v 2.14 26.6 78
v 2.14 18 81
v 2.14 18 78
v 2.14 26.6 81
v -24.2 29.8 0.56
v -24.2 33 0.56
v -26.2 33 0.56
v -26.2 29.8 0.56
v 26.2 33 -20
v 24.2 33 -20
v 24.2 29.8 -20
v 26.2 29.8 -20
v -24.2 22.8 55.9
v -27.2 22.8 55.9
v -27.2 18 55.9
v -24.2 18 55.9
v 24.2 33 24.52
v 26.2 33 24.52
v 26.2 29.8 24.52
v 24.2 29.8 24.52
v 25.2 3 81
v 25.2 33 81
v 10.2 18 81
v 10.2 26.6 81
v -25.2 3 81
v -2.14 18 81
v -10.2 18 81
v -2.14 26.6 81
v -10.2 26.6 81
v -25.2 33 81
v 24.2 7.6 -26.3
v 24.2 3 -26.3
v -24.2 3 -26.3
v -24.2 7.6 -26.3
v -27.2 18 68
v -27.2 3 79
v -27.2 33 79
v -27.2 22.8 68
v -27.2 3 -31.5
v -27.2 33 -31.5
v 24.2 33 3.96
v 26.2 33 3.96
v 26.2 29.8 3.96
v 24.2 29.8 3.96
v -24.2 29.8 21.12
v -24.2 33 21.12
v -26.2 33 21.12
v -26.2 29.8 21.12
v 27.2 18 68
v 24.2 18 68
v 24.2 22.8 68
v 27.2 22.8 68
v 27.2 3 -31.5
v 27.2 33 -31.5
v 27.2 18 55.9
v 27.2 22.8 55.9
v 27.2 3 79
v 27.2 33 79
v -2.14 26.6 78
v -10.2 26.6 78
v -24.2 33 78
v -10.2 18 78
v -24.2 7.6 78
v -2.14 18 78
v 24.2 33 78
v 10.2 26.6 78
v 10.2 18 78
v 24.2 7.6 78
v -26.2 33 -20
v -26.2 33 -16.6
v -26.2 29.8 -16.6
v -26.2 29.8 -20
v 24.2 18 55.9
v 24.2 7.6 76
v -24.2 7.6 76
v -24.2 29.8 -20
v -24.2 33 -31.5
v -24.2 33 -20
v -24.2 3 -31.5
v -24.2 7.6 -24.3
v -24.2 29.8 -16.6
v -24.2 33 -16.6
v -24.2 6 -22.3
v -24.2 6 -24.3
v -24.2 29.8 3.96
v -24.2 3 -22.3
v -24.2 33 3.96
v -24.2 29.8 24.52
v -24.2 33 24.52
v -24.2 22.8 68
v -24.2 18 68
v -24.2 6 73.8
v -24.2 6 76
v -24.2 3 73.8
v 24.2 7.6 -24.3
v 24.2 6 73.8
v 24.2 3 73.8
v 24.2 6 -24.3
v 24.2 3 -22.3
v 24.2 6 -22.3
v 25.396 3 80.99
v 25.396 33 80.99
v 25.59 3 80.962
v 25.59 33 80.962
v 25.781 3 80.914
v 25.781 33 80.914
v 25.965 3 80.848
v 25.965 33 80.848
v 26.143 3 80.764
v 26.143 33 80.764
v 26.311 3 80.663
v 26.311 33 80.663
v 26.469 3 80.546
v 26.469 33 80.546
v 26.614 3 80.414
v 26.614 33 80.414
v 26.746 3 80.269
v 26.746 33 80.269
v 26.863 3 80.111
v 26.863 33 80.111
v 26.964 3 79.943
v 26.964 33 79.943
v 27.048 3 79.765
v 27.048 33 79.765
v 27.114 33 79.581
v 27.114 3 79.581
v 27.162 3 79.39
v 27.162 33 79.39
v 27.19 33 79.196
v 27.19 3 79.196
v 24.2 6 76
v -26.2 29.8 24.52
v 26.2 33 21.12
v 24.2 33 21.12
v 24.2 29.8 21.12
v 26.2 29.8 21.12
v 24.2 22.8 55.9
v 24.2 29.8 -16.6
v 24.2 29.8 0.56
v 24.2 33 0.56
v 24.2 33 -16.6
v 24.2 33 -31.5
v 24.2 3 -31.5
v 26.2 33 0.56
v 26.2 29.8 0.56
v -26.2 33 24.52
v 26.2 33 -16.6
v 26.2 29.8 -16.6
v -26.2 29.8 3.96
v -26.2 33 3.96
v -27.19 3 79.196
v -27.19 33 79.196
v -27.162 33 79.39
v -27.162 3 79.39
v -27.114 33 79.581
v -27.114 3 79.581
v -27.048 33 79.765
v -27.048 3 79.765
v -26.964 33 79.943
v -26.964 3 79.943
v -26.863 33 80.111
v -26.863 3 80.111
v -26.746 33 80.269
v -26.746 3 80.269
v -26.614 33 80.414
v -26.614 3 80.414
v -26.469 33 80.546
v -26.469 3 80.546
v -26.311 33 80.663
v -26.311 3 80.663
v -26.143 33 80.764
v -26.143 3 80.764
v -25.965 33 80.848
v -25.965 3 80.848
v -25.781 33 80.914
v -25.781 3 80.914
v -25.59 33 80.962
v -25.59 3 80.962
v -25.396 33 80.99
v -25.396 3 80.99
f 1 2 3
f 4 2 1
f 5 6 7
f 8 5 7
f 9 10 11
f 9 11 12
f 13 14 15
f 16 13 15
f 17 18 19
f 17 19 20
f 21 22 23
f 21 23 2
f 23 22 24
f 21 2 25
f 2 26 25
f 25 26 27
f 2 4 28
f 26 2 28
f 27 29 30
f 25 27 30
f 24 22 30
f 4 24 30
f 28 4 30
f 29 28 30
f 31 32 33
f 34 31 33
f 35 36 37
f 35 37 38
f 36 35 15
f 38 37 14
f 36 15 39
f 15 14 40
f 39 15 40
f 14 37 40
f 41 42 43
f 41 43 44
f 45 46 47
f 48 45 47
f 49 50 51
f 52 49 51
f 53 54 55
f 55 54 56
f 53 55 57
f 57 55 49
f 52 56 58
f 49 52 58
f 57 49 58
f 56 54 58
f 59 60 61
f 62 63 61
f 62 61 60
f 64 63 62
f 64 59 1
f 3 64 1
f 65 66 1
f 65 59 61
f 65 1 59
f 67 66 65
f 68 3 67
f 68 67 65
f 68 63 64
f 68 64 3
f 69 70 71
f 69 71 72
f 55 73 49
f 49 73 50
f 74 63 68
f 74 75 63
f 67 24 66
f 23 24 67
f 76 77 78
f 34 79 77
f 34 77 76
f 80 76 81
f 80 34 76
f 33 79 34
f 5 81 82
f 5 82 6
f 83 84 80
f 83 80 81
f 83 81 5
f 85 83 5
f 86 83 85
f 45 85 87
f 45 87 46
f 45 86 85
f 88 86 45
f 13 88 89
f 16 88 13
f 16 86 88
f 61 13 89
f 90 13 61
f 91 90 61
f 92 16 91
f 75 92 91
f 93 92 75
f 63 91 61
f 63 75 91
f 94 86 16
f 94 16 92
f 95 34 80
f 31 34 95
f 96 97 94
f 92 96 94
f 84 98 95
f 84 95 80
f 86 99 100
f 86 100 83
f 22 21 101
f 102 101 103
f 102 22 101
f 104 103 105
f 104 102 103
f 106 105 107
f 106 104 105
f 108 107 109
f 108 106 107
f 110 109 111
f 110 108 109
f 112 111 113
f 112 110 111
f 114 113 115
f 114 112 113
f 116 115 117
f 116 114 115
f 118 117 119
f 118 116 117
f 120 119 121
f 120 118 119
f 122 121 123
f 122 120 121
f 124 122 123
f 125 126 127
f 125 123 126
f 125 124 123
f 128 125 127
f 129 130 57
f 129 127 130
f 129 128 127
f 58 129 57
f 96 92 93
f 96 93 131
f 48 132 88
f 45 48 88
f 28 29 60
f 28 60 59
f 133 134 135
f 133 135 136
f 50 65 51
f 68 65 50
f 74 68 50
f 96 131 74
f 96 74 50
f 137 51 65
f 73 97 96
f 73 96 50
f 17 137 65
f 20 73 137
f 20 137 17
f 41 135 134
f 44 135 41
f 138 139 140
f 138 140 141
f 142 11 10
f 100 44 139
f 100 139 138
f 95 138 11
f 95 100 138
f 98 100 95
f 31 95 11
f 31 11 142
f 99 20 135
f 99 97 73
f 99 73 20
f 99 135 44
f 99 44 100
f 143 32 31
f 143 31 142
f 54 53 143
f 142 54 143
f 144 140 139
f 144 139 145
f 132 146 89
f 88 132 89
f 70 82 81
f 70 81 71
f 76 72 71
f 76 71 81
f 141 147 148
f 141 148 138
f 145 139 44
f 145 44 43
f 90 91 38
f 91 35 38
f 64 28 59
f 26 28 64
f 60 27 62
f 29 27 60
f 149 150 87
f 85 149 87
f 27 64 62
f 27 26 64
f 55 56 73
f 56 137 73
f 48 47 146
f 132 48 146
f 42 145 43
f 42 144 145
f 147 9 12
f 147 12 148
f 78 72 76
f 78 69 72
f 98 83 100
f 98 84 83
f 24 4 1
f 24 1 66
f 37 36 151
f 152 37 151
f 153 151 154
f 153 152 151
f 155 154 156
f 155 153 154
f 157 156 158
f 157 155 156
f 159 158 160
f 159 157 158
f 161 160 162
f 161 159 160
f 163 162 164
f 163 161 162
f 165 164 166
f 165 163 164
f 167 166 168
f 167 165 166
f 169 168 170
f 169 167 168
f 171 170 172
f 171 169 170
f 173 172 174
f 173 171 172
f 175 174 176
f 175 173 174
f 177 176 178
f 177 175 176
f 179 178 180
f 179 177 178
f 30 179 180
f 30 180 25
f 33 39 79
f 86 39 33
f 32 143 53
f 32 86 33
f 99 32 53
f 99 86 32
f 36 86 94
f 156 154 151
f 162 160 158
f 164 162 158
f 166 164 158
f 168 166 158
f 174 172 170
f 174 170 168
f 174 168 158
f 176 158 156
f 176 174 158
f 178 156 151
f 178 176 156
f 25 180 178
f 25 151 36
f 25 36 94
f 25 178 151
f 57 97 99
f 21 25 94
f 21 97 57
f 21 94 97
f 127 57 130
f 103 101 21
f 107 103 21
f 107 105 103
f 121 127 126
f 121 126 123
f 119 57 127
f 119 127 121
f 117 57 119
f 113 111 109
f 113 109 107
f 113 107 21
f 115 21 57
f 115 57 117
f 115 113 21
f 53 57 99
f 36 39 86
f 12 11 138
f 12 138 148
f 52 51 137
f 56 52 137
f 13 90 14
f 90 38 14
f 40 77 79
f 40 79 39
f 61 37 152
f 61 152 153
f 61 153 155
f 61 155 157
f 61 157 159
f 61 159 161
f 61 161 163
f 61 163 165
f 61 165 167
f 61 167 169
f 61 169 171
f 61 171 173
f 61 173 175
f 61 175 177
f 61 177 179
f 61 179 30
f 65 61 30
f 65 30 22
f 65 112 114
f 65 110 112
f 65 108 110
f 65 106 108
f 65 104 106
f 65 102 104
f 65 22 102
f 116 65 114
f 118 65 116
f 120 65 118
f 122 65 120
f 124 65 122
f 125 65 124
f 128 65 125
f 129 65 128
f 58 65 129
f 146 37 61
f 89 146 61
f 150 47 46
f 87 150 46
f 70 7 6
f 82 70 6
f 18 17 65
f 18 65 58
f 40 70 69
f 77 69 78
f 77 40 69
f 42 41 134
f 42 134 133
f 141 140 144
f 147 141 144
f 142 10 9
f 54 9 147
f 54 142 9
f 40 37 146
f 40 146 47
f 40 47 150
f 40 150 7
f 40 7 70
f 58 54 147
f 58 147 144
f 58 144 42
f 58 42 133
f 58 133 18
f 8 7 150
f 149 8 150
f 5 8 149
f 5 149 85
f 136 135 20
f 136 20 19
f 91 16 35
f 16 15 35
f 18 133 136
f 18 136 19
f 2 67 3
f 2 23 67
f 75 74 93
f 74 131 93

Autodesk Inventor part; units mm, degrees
ref_plane "YZ Plane" through (0, 0, 0) normal (1, 0, 0) x (0, 1, 0)
ref_plane "XZ Plane" through (0, 0, 0) normal (0, 1, 0) x (-1, 0, 0)
ref_plane "XY Plane" through (0, 0, 0) normal (0, 0, 1) x (1, 0, 0)
sketch "Sketch2" plane through (0, 0, 0) normal (0, 1, 0) x (-1, 0, 0)
  line L0 (-30.2, -84) -> (30.2, -84)
  line L1 (30.2, -84) -> (30.2, 84)
  line L2 (30.2, 84) -> (-30.2, 84)
  line L3 (-30.2, 84) -> (-30.2, -84)
  line L4 (-30.2, -84) -> (30.2, 84) construction
  line L5 (30.2, -84) -> (-30.2, 84) construction
  point P0 (0, 0)
  dimension "d0" = 60.4
  dimension "d1" = 168
extrude "Extrusion1" add sketch "Sketch2" along normal blind 3
sketch "Sketch3" plane through (0, 3, 0) normal (0, 1, 0) x (1, 0, 0)
  line L0 (27.2, 81) -> (-27.2, 81)
  line L1 (-27.2, 81) -> (-27.2, -81)
  line L2 (-27.2, -81) -> (27.2, -81)
  line L3 (27.2, -81) -> (27.2, 81)
  line L4 (27.2, 81) -> (-27.2, -81) construction
  line L5 (-27.2, 81) -> (27.2, -81) construction
  line L6 (-30.2, 84) -> (-30.2, -84) projected
  line L7 (-30.2, -84) -> (30.2, -84) projected
  line L8 (24.2, 78) -> (-24.2, 78)
  line L9 (-24.2, 78) -> (-24.2, -78)
  line L10 (-24.2, -78) -> (24.2, -78)
  line L11 (24.2, -78) -> (24.2, 78)
  line L12 (24.2, 78) -> (-24.2, -78) construction
  line L13 (-24.2, 78) -> (24.2, -78) construction
  point P0 (0, 0)
  dimension "d4" = 3
  dimension "d5" = 3
  dimension "d6" = 3
  dimension "d7" = 3
extrude "Extrusion2" add sketch "Sketch3" along normal blind 30
fillet "Fillet1" radius 2 8 edges at (27.2, 18, 81) (-27.2, 18, 81) (-30.2, 1.5, 84) (30.2, 1.5, 84) (27.2, 18, -81) (-27.2, 18, -81) (30.2, 1.5, -84) (-30.2, 1.5, -84)
sketch "Sketch10" plane through (0, 3, 0) normal (0, 1, 0) x (1, 0, 0)
  line L0 (24.2, 78) -> (-24.2, 78) projected
  line L1 (-24.2, 78) -> (-24.2, -78) projected
  line L2 (-24.2, -78) -> (24.2, -78) projected
  line L3 (24.2, -78) -> (24.2, 78) projected
  line L4 (-24.2, -78) -> (24.2, -78)
  line L5 (24.2, -78) -> (24.2, -73.8)
  line L6 (24.2, -73.8) -> (-24.2, -73.8)
  line L7 (-24.2, -73.8) -> (-24.2, -78)
  line L8 (-24.2, -73.8) -> (24.2, -73.8)
  line L9 (24.2, -73.8) -> (24.2, 22.3)
  line L10 (24.2, 22.3) -> (-24.2, 22.3)
  line L11 (-24.2, 22.3) -> (-24.2, -73.8)
  line L12 (-24.2, 22.3) -> (24.2, 22.3)
  line L13 (24.2, 22.3) -> (24.2, 26.3)
  line L14 (24.2, 26.3) -> (-24.2, 26.3)
  line L15 (-24.2, 26.3) -> (-24.2, 22.3)
  point P0 (0, 0)
  point P1 (-24.2, 26.3)
  point P2 (-24.2, 22.3)
  dimension "d90" = 4.2
  dimension "d91" = 96.1
  dimension "d92" = 4
extrude "Extrusion9" add sketch "Sketch10" along normal blind 3 contours L3 L10 L1 L14 | L3 L2 L1 L6
sketch "Sketch11" plane through (0, 6, 0) normal (0, 1, 0) x (1, 0, 0)
  line L0 (-24.2, 22.3) -> (-24.2, 26.3) projected
  line L1 (-24.2, 22.3) -> (24.2, 22.3) projected
  line L2 (24.2, 26.3) -> (24.2, 22.3) projected
  line L3 (24.2, 26.3) -> (-24.2, 26.3) projected
  line L4 (-24.2, -78) -> (-24.2, -73.8) projected
  line L5 (24.2, -78) -> (-24.2, -78) projected
  line L6 (24.2, -73.8) -> (24.2, -78) projected
  line L7 (24.2, -73.8) -> (-24.2, -73.8) projected
  line L8 (24.2, 26.3) -> (-24.2, 26.3) projected
  line L9 (-24.2, 26.3) -> (24.2, 26.3)
  line L10 (24.2, 26.3) -> (24.2, 24.3)
  line L11 (24.2, 24.3) -> (-24.2, 24.3)
  line L12 (-24.2, 24.3) -> (-24.2, 26.3)
  line L13 (24.2, 26.3) -> (24.2, -78) projected
  line L14 (-24.2, -78) -> (24.2, -78)
  line L15 (24.2, -78) -> (24.2, -76)
  line L16 (24.2, -76) -> (-24.2, -76)
  line L17 (-24.2, -76) -> (-24.2, -78)
  line L18 (-24.2, 22.3) -> (-24.2, 26.3) projected
  line L19 (-24.2, 22.3) -> (24.2, 22.3) projected
  line L20 (24.2, 26.3) -> (-24.2, 26.3) projected
  line L21 (24.2, 26.3) -> (24.2, 22.3) projected
  point P0 (0, 0)
  point P1 (24.2, -72.6)
  point P2 (-24.2, 24.3)
  point P3 (-24.2, -76)
  point P4 (-24.2, -76)
  dimension "d95" = 2
  dimension "d120" = 2
extrude "Extrusion10" add sketch "Sketch11" along normal blind 1.6 contours L0 L3 L2 L11 | L6 L5 L4 L16
sketch "Sketch12" plane through (-25.2, 3, 81) normal (0, 0, 1) x (1, 0, 0)
  line L0 (-2, 30) -> (-2, 0) projected
  line L1 (0, 30) -> (50.4, 30) projected
  line L2 (-2, 30) -> (0, 30) projected
  line L3 (50.4, 30) -> (52.4, 30) projected
  line L4 (52.4, 0) -> (52.4, 30) projected
  line L5 (50.4, 0) -> (0, 0) projected
  line L6 (0, 0) -> (-2, 0) projected
  line L7 (52.4, 0) -> (50.4, 0) projected
  line L8 (15, 23.6) -> (23.06, 23.6)
  line L9 (23.06, 23.6) -> (23.06, 15)
  line L10 (23.06, 15) -> (15, 15)
  line L11 (15, 15) -> (15, 23.6)
  line L12 (27.34, 23.6) -> (35.4, 23.6)
  line L13 (35.4, 23.6) -> (35.4, 15)
  line L14 (35.4, 15) -> (27.34, 15)
  line L15 (27.34, 15) -> (27.34, 23.6)
  point P0 (25.2, -3)
  dimension "d116" = 8.06
  dimension "d117" = 8.6
  dimension "d118" = 15
  dimension "d119" = 17
  dimension "d121" = 8.06
  dimension "d122" = 8.6
  dimension "d123" = 15
  dimension "d124" = 17
extrude "Extrusion11" cut sketch "Sketch12" against normal blind 3 contours L8 L9 L10 L11 | L12 L13 L14 L15
sketch "Sketch13" plane through (0, 3, 0) normal (0, 1, 0) x (1, 0, 0)
  arc A0 (-28.2, 84) -> (-30.2, 82) centre (-28.2, 82) ccw projected
  line L0 (-30.2, 82) -> (-30.2, -82) projected
  arc A1 (-30.2, -82) -> (-28.2, -84) centre (-28.2, -82) ccw projected
  line L1 (-28.2, -84) -> (28.2, -84) projected
  arc A2 (28.2, -84) -> (30.2, -82) centre (28.2, -82) ccw projected
  line L2 (30.2, -82) -> (30.2, 82) projected
  arc A3 (30.2, 82) -> (28.2, 84) centre (28.2, 82) ccw projected
  line L3 (28.2, 84) -> (-28.2, 84) projected
  line L4 (-25.2, 81) -> (25.2, 81) projected
  arc A4 (27.2, 79) -> (25.2, 81) centre (25.2, 79) ccw projected
  line L5 (27.2, 79) -> (27.2, -79) projected
  arc A5 (25.2, -81) -> (27.2, -79) centre (25.2, -79) ccw projected
  line L6 (25.2, -81) -> (-25.2, -81) projected
  arc A6 (-27.2, -79) -> (-25.2, -81) centre (-25.2, -79) ccw projected
  line L7 (-27.2, -79) -> (-27.2, 79) projected
  arc A7 (-25.2, 81) -> (-27.2, 79) centre (-25.2, 79) ccw projected
  point P0 (0, 0)
extrude "Extrusion12" cut sketch "Sketch13" against normal blind 3
sketch "Sketch14" plane through (25.2, 33, -81) normal (0, 0, -1) x (-1, 0, 0)
  line L0 (1, -10) -> (49.4, -10)
  line L1 (49.4, -10) -> (49.4, -19.6)
  line L2 (49.4, -19.6) -> (1, -19.6)
  line L3 (1, -19.6) -> (1, -10)
  line L4 (52.4, -33) -> (52.4, 0) projected
  line L5 (-2, 0) -> (-2, -33) projected
  line L6 (50.4, 0) -> (50.4, -33) projected
  line L7 (50.4, -33) -> (0, -33) projected
  point P0 (25.2, -33)
  point P1 (50.4, -16.5)
  point P2 (49.4, -14.8)
  dimension "d127" = 9.6
  dimension "d128" = 3
  dimension "d129" = 3
  dimension "d140" = 23
extrude "Extrusion13" add sketch "Sketch14" along normal blind 6
sketch "Sketch15" plane through (-24.2, 13.4, -81) normal (-1, 0, 0) x (0, 0, 1)
  line L0 (0, 9.6) -> (-6, 9.6) projected
  line L1 (0, 9.6) -> (-3.4, 9.6)
  line L2 (-3.4, 9.6) -> (-3.4, 6.6)
  line L3 (-3.4, 6.6) -> (0, 6.6)
  line L4 (0, 6.6) -> (0, 9.6)
  line L5 (0, 9.6) -> (0, 0) projected
  line L6 (0, 9.6) -> (-6, 9.6) projected
  line L7 (-6, 0) -> (-6, 9.6) projected
  line L8 (0, 0) -> (-6, 0) projected
  line L9 (0, 0) -> (-3.4, 0)
  line L10 (-3.4, 0) -> (-3.4, 3)
  line L11 (-3.4, 3) -> (0, 3)
  line L12 (0, 3) -> (0, 0)
  point P0 (81, -13.4)
  point P1 (-3.4, 0)
  dimension "d133" = 3.4
  dimension "d134" = 3
  dimension "d135" = 3.4
  dimension "d136" = 3
extrude "Extrusion14" cut sketch "Sketch15" against normal up to surface (48.4 mm away) contours L4 L3 L2 L0 | L5 L8 L10 L11
fillet "Fillet8" radius 1 18 edges at (0, 23, -87) (0, 23, -84.4) (0, 13.4, -87) (0, 13.4, -84.4) (-24.2, 14.9, -84.4) (-24.2, 18.2, -87) (-24.2, 21.5, -84.4) (-24.2, 23, -85.7) (-24.2, 13.4, -85.7) (-24.2, 16.4, -82.7) (-24.2, 20, -82.7) (24.2, 20, -82.7) (24.2, 16.4, -82.7) (24.2, 14.9, -84.4) (24.2, 21.5, -84.4) (24.2, 23, -85.7) (24.2, 18.2, -87) (24.2, 13.4, -85.7)
sketch "Sketch16" plane through (-27.2, 0, -79) normal (-1, 0, 0) x (0, 0, 1)
  line L0 (147, 22.8) -> (134.9, 22.8)
  line L1 (134.9, 22.8) -> (134.9, 18)
  line L2 (134.9, 18) -> (147, 18)
  line L3 (147, 18) -> (147, 22.8)
  line L4 (160, 3) -> (160, 33) projected
  line L5 (152, 0) -> (0, 0) projected
  point P0 (79, 0)
  point P1 (154, 0)
  dimension "d141" = 12.1
  dimension "d142" = 4.8
  dimension "d143" = 13
  dimension "d144" = 18
extrude "Extrusion15" cut sketch "Sketch16" against normal through all
sketch "Sketch17" plane through (0, 33, 0) normal (0, 1, 0) x (1, 0, 0)
  arc A0 (-25.2, 81) -> (-27.2, 79) centre (-25.2, 79) ccw projected
  line L0 (-27.2, 79) -> (-27.2, -79) projected
  arc A1 (-27.2, -79) -> (-25.2, -81) centre (-25.2, -79) ccw projected
  line L1 (-25.2, -81) -> (25.2, -81) projected
  arc A2 (25.2, -81) -> (27.2, -79) centre (25.2, -79) ccw projected
  line L2 (27.2, -79) -> (27.2, 79) projected
  arc A3 (27.2, 79) -> (25.2, 81) centre (25.2, 79) ccw projected
  line L3 (25.2, 81) -> (-25.2, 81) projected
  line L4 (24.2, 78) -> (24.2, -78) projected
  line L5 (24.2, -78) -> (-24.2, -78) projected
  line L6 (-24.2, -78) -> (-24.2, 78) projected
  line L7 (-24.2, 78) -> (24.2, 78) projected
  line L8 (-26.2, 20) -> (-24.2, 20)
  line L9 (-24.2, 20) -> (-24.2, 16.6)
  line L10 (-24.2, 16.6) -> (-26.2, 16.6)
  line L11 (-26.2, 16.6) -> (-26.2, 20)
  line L12 (-24.2, -0.56) -> (-26.2, -0.56)
  line L13 (-26.2, -0.56) -> (-26.2, -3.96)
  line L14 (-26.2, -3.96) -> (-24.2, -3.96)
  line L15 (-24.2, -3.96) -> (-24.2, -0.56)
  line L16 (-24.2, 22.3) -> (-24.2, 26.3) projected
  line L17 (-24.2, -21.12) -> (-26.2, -21.12)
  line L18 (-26.2, -21.12) -> (-26.2, -24.52)
  line L19 (-26.2, -24.52) -> (-24.2, -24.52)
  line L20 (-24.2, -24.52) -> (-24.2, -21.12)
  line L21 (24.2, 20) -> (26.2, 20)
  line L22 (26.2, 20) -> (26.2, 16.6)
  line L23 (26.2, 16.6) -> (24.2, 16.6)
  line L24 (24.2, 16.6) -> (24.2, 20)
  line L25 (24.2, -0.56) -> (26.2, -0.56)
  line L26 (26.2, -0.56) -> (26.2, -3.96)
  line L27 (26.2, -3.96) -> (24.2, -3.96)
  line L28 (24.2, -3.96) -> (24.2, -0.56)
  line L29 (24.2, -21.12) -> (26.2, -21.12)
  line L30 (26.2, -21.12) -> (26.2, -24.52)
  line L31 (26.2, -24.52) -> (24.2, -24.52)
  line L32 (24.2, -24.52) -> (24.2, -21.12)
  point P0 (0, 0)
  point P1 (-24.2, 16.6)
  point P2 (-24.2, -73.8)
  point P3 (24.2, 16.6)
  point P4 (24.2, -3.96)
  point P5 (24.2, -24.52)
  point P6 (-24.2, -24.52)
  point P7 (-24.2, -21.12)
  point P8 (-24.2, -3.96)
  dimension "d147" = 2
  dimension "d148" = 3.4
  dimension "d149" = 61
  dimension "d150" = 0
  dimension "d153" = 2
  dimension "d154" = 3.4
  dimension "d155" = 20.56
  dimension "d156" = 2
  dimension "d157" = 3.4
  dimension "d158" = 20.56
  dimension "d159" = 2
  dimension "d160" = 3.4
  dimension "d161" = 2
  dimension "d162" = 3.4
  dimension "d163" = 2
  dimension "d164" = 3.4
  dimension "d165" = 20.56
  dimension "d166" = 20.56
  dimension "d167" = 61
extrude "Extrusion16" cut sketch "Sketch17" against normal blind 3.2 contours L21 L22 L23 L4 | L25 L26 L27 L4 | L6 L10 L11 L8 | L29 L30 L31 L4 | L6 L14 L13 L12 | L6 L19 L18 L17
sketch "Sketch18" plane through (0, 33, 0) normal (0, 1, 0) x (1, 0, 0)
  line L0 (24.2, -21.12) -> (26.2, -21.12) projected
  line L1 (26.2, -21.12) -> (26.2, -24.52) projected
  line L2 (26.2, -24.52) -> (24.2, -24.52) projected
  line L3 (24.2, -24.52) -> (24.2, -78) projected
  line L4 (24.2, -78) -> (-24.2, -78) projected
  line L5 (-24.2, -78) -> (-24.2, -24.52) projected
  line L6 (-24.2, -24.52) -> (-26.2, -24.52) projected
  line L7 (-26.2, -24.52) -> (-26.2, -21.12) projected
  line L8 (-26.2, -21.12) -> (-24.2, -21.12) projected
  line L9 (-24.2, -21.12) -> (-24.2, -3.96) projected
  line L10 (-24.2, -3.96) -> (-26.2, -3.96) projected
  line L11 (-26.2, -3.96) -> (-26.2, -0.56) projected
  line L12 (-26.2, -0.56) -> (-24.2, -0.56) projected
  line L13 (-24.2, -0.56) -> (-24.2, 16.6) projected
  line L14 (-24.2, 16.6) -> (-26.2, 16.6) projected
  line L15 (-26.2, 16.6) -> (-26.2, 20) projected
  line L16 (-26.2, 20) -> (-24.2, 20) projected
  line L17 (-24.2, 20) -> (-24.2, 78) projected
  line L18 (-24.2, 78) -> (24.2, 78) projected
  line L19 (24.2, 78) -> (24.2, 20) projected
  line L20 (24.2, 20) -> (26.2, 20) projected
  line L21 (26.2, 20) -> (26.2, 16.6) projected
  line L22 (26.2, 16.6) -> (24.2, 16.6) projected
  line L23 (24.2, 16.6) -> (24.2, -0.56) projected
  line L24 (24.2, -0.56) -> (26.2, -0.56) projected
  line L25 (26.2, -0.56) -> (26.2, -3.96) projected
  line L26 (26.2, -3.96) -> (24.2, -3.96) projected
  line L27 (24.2, -3.96) -> (24.2, -21.12) projected
  arc A0 (-25.2, 81) -> (-27.2, 79) centre (-25.2, 79) ccw projected
  line L28 (-27.2, 79) -> (-27.2, -79) projected
  arc A1 (-27.2, -79) -> (-25.2, -81) centre (-25.2, -79) ccw projected
  line L29 (-25.2, -81) -> (25.2, -81) projected
  arc A2 (25.2, -81) -> (27.2, -79) centre (25.2, -79) ccw projected
  line L30 (27.2, -79) -> (27.2, 79) projected
  arc A3 (27.2, 79) -> (25.2, 81) centre (25.2, 79) ccw projected
  line L31 (25.2, 81) -> (-25.2, 81) projected
  line L32 (27.2, 31.5) -> (-27.2, 31.5)
  line L33 (-27.2, 31.5) -> (-27.2, 181.5)
  line L34 (-27.2, 181.5) -> (27.2, 181.5)
  line L35 (27.2, 181.5) -> (27.2, 31.5)
  line L36 (24.2, -55.9) -> (27.2, -55.9) projected
  line L37 (24.2, 26.5) -> (-24.2, 26.5) projected
  point P0 (0, 0)
  point P1 (27.2, 79)
  point P2 (24.2, 26.3)
  point P3 (-24.2, 26.3)
  dimension "d168" = 150
  dimension "d179" = 5
extrude "Extrusion17" cut sketch "Sketch18" against normal through all contours L32 L19 L18 L17 L28 A0 L31 A3 L30 | A3 L31 A0 L33 L34 L35 | L32 L17 L18 L19
sketch "Sketch19" plane through (0, 0, 0) normal (0, -1, 0) x (1, 0, 0)
  line L0 (-27.2, -31.5) -> (27.2, -31.5) projected
  line L1 (27.2, -31.5) -> (27.2, 79) projected
  arc A0 (27.2, 79) -> (25.2, 81) centre (25.2, 79) ccw projected
  line L2 (25.2, 81) -> (-25.2, 81) projected
  arc A1 (-25.2, 81) -> (-27.2, 79) centre (-25.2, 79) ccw projected
  line L3 (-27.2, 79) -> (-27.2, -31.5) projected
  point P0 (0, 0)
extrude "Extrusion18" cut sketch "Sketch19" against normal blind 3
equation "\"d167\" = d149"
properties part number "module_switch" material "PC/ABS Plastic"
